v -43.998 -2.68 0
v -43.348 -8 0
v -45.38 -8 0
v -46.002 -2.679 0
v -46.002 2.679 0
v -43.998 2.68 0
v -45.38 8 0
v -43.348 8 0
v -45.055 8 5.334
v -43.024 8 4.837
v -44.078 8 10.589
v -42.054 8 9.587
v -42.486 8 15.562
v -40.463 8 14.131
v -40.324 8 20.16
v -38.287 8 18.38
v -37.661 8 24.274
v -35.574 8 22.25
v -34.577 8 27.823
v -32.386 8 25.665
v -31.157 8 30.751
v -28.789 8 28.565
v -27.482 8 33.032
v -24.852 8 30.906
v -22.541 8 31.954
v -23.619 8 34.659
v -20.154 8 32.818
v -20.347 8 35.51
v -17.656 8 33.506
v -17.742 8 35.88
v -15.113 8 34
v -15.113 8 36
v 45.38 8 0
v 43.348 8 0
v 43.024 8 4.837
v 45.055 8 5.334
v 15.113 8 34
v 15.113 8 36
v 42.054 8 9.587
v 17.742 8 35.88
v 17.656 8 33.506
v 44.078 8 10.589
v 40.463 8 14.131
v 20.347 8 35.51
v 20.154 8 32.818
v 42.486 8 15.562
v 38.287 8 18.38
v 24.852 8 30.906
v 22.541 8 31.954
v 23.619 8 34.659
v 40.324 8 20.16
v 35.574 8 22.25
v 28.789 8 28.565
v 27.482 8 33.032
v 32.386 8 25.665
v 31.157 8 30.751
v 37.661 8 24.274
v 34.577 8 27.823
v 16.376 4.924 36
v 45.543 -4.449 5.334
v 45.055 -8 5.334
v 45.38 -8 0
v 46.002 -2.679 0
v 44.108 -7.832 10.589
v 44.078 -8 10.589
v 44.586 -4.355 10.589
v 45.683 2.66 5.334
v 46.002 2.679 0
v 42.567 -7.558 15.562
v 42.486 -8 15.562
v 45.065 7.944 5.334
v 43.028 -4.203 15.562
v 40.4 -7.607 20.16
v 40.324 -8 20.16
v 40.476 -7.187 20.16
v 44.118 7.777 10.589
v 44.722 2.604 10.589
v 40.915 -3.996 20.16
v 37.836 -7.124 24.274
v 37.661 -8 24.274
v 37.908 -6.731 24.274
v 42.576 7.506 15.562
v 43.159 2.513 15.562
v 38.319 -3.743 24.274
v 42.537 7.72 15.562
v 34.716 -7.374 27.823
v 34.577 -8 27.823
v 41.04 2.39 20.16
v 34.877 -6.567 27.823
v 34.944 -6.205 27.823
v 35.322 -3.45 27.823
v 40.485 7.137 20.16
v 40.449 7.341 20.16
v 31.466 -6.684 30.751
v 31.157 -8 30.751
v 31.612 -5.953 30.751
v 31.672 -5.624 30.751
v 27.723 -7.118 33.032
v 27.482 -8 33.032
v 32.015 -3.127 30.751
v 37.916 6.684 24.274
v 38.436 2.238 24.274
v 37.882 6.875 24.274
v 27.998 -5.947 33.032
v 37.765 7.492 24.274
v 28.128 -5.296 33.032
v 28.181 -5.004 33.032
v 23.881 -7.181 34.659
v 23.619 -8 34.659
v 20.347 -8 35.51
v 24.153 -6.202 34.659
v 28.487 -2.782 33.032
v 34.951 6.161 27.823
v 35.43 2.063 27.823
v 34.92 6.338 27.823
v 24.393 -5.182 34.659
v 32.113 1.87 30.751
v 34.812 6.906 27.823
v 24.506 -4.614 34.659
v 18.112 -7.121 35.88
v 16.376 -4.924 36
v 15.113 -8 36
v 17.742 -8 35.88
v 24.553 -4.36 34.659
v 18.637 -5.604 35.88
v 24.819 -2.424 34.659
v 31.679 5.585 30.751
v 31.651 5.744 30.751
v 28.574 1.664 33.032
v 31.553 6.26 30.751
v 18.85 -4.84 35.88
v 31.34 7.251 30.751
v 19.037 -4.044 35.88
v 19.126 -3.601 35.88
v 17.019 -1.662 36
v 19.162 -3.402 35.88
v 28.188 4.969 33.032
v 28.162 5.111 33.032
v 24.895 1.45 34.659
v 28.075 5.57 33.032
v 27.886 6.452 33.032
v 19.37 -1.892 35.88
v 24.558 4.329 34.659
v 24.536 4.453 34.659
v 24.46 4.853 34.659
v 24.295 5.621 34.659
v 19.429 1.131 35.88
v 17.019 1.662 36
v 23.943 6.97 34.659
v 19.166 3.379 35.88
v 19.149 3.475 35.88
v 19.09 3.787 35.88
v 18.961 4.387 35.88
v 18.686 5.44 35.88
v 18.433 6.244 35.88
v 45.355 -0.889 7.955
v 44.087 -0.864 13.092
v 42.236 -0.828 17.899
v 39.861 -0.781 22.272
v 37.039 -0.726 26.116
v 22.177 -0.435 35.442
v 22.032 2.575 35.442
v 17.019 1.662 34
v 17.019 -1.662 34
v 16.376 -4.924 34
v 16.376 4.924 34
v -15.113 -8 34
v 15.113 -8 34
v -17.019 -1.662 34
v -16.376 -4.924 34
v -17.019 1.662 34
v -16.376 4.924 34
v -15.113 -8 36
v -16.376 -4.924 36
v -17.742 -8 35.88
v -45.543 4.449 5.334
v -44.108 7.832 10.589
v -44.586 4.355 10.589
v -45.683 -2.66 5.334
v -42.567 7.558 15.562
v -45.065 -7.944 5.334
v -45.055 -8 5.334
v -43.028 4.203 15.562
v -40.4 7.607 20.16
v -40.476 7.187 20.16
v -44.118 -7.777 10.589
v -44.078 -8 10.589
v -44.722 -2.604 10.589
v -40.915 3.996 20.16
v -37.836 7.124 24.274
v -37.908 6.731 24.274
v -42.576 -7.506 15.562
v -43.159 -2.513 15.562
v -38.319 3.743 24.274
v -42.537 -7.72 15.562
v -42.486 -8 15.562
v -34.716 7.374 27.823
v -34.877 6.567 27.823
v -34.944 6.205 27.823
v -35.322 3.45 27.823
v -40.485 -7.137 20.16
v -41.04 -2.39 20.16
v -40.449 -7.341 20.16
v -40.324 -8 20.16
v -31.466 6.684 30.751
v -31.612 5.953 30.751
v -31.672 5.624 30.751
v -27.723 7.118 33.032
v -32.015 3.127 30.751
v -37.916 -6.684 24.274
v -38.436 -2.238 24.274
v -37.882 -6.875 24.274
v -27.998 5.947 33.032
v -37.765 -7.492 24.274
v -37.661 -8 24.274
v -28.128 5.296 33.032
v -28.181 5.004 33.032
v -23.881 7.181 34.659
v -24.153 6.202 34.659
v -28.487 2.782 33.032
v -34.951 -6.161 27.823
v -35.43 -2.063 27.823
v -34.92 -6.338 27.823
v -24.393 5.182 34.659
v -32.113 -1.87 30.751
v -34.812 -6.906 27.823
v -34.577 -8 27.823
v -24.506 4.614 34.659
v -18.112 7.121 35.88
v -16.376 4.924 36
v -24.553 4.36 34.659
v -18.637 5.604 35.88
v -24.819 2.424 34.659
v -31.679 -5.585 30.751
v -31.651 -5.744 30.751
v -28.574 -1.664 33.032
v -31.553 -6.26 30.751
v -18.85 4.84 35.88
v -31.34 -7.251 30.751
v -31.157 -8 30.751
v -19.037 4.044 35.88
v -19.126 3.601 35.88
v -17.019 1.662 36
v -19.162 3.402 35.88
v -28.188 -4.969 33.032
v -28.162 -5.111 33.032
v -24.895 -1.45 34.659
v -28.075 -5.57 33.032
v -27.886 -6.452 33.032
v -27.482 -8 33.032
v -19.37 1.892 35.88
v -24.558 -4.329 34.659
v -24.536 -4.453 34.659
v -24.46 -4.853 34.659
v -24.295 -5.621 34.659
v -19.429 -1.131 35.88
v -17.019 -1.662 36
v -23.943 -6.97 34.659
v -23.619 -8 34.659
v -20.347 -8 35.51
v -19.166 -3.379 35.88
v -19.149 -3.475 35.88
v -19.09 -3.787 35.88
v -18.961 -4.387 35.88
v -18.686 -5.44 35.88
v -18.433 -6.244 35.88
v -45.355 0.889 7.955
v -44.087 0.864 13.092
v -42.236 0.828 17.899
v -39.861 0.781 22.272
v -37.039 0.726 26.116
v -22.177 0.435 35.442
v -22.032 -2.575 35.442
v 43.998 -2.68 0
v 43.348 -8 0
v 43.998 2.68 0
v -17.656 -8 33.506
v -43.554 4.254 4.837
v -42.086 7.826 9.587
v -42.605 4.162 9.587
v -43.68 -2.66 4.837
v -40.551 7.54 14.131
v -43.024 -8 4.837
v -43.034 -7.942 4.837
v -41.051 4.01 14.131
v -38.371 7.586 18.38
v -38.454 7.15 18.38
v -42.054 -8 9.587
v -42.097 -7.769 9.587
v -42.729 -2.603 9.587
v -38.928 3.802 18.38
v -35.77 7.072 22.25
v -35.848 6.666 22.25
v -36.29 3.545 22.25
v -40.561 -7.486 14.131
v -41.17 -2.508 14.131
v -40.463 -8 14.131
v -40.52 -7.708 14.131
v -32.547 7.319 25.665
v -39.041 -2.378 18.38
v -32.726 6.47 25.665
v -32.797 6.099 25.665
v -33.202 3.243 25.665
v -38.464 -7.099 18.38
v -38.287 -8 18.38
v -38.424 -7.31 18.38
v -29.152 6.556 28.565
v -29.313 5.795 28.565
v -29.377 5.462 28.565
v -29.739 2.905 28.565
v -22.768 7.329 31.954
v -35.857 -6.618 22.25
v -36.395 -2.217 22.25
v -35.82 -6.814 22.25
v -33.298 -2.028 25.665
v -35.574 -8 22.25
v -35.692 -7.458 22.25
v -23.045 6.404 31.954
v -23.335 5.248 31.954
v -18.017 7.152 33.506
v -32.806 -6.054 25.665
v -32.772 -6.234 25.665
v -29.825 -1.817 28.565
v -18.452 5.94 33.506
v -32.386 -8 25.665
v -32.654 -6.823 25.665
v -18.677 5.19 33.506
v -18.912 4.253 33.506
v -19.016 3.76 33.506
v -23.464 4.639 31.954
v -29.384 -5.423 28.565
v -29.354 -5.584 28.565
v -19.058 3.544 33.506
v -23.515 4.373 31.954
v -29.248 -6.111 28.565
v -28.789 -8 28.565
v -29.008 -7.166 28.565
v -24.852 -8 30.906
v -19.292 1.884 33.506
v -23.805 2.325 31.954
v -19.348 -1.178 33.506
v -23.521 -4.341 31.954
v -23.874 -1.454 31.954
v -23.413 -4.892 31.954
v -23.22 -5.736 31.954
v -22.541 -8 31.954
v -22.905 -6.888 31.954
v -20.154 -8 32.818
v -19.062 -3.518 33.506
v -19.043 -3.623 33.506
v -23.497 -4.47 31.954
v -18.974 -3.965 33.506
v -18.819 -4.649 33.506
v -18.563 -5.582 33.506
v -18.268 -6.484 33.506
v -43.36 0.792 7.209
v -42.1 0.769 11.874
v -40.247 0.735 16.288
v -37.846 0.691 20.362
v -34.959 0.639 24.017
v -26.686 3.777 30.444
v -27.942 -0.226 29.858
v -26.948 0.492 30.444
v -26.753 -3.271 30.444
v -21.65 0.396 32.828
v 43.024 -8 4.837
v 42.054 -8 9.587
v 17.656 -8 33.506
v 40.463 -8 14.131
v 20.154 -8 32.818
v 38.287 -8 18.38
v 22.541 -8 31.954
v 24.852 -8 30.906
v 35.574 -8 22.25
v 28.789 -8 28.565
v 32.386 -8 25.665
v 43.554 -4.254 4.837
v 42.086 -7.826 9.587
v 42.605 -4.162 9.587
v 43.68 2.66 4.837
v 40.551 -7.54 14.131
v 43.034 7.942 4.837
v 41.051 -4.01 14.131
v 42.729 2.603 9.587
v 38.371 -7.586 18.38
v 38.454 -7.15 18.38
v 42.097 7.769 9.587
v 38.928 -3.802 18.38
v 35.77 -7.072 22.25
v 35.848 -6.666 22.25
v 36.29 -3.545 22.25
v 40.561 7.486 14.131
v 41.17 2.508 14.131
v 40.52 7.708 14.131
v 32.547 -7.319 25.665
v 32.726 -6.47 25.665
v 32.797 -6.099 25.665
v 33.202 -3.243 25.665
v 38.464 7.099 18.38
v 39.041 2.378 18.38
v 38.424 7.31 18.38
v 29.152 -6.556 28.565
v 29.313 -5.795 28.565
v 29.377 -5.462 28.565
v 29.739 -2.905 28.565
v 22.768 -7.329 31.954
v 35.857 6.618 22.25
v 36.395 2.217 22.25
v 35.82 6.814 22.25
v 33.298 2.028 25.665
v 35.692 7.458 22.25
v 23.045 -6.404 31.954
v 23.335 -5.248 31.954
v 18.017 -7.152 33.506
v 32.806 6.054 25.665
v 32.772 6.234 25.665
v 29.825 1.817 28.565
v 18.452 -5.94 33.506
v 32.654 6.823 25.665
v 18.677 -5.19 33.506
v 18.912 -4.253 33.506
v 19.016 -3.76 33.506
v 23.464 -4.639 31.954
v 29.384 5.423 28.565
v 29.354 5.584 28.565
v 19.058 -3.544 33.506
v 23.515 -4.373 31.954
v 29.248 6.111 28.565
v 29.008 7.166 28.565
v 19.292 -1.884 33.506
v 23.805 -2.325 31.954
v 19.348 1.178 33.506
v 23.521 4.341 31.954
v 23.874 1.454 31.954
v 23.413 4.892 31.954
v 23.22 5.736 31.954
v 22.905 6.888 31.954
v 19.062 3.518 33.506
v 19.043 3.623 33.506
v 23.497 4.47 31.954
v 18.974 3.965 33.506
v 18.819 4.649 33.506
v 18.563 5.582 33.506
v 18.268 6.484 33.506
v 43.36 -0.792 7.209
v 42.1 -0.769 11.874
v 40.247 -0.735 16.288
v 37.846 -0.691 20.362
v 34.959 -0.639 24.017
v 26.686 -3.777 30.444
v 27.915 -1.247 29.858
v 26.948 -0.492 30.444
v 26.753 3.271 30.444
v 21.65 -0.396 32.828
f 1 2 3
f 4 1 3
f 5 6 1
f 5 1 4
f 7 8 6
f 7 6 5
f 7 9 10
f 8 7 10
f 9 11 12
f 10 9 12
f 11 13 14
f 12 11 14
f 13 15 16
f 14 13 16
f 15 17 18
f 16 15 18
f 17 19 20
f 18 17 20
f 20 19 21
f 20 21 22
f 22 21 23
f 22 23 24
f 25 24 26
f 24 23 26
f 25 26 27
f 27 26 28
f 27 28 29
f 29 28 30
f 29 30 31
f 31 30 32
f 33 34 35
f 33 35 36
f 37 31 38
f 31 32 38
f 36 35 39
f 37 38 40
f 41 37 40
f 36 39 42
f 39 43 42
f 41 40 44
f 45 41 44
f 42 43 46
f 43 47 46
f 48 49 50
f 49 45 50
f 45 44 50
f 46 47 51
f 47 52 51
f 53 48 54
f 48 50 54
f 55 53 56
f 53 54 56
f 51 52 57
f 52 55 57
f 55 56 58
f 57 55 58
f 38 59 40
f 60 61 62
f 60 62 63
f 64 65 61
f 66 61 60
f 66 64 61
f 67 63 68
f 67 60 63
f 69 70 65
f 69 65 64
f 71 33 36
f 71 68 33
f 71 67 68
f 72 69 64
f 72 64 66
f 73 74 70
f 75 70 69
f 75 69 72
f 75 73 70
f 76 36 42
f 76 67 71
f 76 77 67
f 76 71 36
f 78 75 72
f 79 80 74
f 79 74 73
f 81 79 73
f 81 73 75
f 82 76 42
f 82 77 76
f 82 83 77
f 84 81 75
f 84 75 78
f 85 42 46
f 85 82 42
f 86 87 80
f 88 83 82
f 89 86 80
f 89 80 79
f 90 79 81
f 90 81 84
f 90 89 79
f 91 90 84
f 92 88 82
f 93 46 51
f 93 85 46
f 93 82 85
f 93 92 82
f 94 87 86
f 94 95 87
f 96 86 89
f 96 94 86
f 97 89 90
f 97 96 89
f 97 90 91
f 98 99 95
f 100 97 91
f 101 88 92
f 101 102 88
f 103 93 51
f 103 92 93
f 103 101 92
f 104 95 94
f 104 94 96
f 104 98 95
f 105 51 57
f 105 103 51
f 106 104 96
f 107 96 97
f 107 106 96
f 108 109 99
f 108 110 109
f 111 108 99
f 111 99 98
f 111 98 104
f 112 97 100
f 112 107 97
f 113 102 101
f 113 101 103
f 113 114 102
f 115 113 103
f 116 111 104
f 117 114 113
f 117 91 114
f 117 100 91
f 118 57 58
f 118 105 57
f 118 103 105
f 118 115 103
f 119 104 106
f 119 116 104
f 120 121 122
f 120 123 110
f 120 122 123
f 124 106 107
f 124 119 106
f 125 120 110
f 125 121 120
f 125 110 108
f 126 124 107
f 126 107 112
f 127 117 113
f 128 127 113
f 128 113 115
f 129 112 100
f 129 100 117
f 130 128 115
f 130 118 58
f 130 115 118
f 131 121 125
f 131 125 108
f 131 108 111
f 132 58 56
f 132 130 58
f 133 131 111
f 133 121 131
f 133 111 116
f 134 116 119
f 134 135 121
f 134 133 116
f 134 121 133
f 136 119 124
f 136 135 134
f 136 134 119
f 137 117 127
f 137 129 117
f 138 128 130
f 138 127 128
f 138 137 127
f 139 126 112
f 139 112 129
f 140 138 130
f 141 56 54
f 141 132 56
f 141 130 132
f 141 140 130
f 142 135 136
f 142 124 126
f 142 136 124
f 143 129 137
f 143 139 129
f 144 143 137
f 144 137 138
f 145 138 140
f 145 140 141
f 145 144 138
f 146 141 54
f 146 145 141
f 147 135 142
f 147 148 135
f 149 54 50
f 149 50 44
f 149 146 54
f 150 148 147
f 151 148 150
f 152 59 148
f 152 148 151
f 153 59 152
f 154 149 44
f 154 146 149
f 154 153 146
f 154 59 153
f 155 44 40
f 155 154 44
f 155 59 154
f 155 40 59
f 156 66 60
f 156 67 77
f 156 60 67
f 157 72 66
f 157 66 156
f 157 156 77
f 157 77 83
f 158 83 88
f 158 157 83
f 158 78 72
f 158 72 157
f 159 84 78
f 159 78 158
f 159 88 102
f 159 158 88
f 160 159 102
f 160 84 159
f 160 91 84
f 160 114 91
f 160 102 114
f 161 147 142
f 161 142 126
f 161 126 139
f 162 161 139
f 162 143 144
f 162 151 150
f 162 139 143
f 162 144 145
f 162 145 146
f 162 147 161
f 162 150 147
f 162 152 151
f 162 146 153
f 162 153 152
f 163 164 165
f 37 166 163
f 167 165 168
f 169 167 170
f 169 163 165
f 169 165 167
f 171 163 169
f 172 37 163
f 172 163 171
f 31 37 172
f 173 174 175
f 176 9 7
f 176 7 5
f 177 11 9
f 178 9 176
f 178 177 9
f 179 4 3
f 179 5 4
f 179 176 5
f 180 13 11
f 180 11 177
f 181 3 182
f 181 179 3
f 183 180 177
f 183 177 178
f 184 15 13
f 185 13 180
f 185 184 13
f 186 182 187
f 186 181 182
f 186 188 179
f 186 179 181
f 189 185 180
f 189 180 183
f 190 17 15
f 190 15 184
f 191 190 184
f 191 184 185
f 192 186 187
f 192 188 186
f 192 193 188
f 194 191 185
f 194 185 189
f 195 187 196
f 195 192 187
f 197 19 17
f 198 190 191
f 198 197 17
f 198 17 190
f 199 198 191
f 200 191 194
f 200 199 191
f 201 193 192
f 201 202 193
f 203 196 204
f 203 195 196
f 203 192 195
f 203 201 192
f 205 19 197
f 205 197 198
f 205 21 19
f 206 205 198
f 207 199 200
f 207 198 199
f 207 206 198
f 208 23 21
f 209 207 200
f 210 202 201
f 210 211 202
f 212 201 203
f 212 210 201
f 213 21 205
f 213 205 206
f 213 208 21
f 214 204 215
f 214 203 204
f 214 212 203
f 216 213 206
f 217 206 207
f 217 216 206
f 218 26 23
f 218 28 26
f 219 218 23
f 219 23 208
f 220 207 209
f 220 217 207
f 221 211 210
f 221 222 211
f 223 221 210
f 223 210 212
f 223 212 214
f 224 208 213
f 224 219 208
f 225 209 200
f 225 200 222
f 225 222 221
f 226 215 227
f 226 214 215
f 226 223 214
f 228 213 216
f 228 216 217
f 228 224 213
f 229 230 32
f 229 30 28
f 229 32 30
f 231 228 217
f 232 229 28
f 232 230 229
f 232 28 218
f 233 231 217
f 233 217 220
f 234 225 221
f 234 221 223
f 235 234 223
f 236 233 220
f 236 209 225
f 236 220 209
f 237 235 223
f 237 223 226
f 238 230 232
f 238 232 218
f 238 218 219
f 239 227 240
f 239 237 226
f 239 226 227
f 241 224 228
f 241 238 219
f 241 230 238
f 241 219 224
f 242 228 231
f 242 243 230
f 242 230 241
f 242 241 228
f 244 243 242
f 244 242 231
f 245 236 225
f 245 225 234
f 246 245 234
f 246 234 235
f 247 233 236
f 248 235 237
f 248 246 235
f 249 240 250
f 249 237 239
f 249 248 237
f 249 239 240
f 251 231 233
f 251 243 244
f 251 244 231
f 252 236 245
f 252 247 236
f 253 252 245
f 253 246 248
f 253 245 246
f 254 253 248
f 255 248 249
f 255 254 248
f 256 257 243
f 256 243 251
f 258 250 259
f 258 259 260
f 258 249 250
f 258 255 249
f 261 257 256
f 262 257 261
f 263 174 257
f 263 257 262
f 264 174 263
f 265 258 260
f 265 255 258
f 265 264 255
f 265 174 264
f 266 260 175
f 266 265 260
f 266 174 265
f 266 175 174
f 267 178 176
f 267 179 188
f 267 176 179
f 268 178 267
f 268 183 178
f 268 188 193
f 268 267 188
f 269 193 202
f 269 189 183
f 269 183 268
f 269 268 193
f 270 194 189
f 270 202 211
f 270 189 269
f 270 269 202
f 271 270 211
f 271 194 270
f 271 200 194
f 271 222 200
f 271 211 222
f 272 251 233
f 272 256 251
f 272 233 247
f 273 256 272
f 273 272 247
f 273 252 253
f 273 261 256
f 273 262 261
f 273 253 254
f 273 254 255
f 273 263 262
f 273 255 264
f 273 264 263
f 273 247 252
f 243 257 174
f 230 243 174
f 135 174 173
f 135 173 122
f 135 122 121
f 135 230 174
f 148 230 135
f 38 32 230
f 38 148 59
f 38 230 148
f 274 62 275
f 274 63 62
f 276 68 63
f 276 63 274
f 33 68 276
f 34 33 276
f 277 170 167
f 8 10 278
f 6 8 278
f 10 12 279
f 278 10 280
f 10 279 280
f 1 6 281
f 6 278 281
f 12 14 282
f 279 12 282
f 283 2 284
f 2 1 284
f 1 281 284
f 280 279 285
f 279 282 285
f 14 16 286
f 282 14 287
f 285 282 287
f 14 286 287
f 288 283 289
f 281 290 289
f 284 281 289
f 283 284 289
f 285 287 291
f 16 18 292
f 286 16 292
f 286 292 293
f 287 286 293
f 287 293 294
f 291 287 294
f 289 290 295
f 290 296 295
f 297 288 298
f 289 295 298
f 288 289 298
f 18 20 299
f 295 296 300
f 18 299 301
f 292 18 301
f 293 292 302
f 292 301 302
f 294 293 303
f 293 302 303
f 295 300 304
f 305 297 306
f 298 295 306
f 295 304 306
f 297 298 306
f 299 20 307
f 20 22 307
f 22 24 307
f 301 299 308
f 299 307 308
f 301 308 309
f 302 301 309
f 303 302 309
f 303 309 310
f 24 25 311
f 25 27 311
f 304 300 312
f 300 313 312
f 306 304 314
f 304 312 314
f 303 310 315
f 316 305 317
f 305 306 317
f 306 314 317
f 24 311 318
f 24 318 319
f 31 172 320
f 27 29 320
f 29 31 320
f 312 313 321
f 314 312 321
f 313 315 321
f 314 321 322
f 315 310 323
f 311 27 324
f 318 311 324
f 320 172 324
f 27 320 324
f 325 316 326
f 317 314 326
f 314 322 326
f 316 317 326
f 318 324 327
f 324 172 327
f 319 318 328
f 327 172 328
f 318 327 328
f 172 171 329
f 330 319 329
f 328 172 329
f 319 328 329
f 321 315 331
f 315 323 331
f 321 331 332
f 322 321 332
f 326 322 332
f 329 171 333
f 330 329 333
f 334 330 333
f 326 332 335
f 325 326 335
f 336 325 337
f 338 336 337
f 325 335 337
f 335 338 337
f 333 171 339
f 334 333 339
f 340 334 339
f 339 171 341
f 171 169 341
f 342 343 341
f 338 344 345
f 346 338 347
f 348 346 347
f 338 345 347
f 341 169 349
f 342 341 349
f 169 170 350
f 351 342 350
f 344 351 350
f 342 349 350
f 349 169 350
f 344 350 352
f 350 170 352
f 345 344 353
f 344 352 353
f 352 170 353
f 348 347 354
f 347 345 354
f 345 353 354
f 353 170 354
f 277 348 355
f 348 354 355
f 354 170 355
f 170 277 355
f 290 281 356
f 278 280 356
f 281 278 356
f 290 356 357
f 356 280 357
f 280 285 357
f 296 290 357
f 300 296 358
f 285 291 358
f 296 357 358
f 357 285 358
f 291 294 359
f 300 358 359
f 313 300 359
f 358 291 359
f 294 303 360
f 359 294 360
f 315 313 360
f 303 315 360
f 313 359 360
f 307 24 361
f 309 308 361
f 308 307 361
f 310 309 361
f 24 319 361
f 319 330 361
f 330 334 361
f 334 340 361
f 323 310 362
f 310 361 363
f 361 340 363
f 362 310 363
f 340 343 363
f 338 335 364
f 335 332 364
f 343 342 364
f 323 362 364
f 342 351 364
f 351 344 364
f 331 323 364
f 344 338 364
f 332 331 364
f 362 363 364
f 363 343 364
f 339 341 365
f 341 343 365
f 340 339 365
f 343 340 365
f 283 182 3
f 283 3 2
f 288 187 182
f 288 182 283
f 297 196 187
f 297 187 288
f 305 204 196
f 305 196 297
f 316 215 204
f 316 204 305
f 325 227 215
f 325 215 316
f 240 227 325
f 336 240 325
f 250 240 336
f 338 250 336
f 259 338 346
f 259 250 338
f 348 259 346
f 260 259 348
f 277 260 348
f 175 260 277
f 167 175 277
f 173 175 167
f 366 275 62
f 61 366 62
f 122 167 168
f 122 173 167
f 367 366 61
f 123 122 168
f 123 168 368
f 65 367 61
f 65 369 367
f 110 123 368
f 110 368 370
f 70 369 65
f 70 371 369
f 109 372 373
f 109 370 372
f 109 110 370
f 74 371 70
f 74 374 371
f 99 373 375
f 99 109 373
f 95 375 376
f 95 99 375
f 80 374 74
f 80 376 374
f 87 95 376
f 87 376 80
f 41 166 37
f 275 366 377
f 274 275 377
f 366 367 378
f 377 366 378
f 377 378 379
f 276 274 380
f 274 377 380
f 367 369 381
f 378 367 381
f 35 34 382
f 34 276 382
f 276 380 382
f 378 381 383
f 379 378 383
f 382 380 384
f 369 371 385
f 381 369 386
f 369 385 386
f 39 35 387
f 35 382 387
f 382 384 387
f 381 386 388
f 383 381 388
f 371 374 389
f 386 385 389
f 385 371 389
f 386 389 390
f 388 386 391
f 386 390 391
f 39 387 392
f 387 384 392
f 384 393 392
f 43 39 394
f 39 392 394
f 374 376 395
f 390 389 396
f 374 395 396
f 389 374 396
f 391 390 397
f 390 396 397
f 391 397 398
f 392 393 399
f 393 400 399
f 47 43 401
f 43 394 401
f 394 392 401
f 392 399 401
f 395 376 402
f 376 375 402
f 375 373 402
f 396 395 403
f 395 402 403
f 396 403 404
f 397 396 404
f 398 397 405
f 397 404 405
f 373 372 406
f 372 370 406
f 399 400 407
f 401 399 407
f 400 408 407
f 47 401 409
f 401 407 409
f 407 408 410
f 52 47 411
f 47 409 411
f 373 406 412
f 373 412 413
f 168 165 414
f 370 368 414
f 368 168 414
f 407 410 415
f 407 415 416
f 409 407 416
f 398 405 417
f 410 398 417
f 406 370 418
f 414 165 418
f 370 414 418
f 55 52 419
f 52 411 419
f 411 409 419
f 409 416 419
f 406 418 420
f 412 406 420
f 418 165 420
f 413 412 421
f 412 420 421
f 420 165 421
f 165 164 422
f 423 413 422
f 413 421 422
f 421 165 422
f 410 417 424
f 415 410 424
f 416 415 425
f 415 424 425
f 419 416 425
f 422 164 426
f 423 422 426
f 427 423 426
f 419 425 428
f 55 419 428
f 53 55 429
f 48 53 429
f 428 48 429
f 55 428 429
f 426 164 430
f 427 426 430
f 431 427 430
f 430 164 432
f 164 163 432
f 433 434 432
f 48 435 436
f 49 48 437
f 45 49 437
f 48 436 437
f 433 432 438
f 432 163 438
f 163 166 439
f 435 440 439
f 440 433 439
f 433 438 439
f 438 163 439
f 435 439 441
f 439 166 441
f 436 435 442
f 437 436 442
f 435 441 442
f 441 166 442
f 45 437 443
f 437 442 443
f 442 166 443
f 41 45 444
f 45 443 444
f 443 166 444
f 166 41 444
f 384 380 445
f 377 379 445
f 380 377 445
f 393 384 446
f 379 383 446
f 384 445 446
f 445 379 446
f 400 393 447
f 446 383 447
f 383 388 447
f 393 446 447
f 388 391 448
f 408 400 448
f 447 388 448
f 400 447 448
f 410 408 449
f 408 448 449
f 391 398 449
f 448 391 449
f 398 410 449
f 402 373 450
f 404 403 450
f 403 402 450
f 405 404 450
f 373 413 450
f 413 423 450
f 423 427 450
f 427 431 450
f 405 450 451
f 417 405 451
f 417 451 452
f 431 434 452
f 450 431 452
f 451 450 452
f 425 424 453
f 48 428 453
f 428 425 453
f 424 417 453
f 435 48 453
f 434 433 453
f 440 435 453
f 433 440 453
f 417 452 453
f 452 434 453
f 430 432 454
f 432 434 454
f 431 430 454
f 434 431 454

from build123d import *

# Parameters (mm, degrees)
BOX_W     = 300
BOX_H     = 300
BOX_DEPTH = 300


with BuildPart() as part:
    # Sketch → Revolution (revolve)
    with BuildSketch(Plane.XZ):
        with BuildLine():
            Line((0, 36), (0, 34))
            Line((0, 34), (17.1, 34))
            add(Edge.make_bspline(
                [(44.08, 0), (44.08, 29.242706), (17.1, 34)],
                knots=[1.570796, 1.570796, 1.570796, 2.978183, 2.978183, 2.978183], degree=2, weights=[1, 0.762458, 1]))
            Line((44.08, 0), (46.08, 0))
            add(Edge.make_bspline(
                [(46.08, 0), (46.08, 35.999994), (17.1, 36)],
                knots=[4.712389, 4.712389, 4.712389, 6.283185, 6.283185, 6.283185], degree=2, weights=[1, 0.707107, 1]))
            Line((17.1, 36), (0, 36))
        make_face()
    revolve(axis=Axis((0, 0, 0), (0, 0, 1)))

    # Box → Box (cut)
    with BuildSketch(Plane(origin=(-86, -8, 0), x_dir=(1, 0, 0), z_dir=(0, -1, 0))):
        with Locations((150, 150)):
            Rectangle(BOX_W, BOX_H)
    box = extrude(amount=BOX_DEPTH, mode=Mode.SUBTRACT)

    # Mirrored: Box across XZ
    add(box.mirror(Plane.XZ), mode=Mode.SUBTRACT)


solid = part.part
